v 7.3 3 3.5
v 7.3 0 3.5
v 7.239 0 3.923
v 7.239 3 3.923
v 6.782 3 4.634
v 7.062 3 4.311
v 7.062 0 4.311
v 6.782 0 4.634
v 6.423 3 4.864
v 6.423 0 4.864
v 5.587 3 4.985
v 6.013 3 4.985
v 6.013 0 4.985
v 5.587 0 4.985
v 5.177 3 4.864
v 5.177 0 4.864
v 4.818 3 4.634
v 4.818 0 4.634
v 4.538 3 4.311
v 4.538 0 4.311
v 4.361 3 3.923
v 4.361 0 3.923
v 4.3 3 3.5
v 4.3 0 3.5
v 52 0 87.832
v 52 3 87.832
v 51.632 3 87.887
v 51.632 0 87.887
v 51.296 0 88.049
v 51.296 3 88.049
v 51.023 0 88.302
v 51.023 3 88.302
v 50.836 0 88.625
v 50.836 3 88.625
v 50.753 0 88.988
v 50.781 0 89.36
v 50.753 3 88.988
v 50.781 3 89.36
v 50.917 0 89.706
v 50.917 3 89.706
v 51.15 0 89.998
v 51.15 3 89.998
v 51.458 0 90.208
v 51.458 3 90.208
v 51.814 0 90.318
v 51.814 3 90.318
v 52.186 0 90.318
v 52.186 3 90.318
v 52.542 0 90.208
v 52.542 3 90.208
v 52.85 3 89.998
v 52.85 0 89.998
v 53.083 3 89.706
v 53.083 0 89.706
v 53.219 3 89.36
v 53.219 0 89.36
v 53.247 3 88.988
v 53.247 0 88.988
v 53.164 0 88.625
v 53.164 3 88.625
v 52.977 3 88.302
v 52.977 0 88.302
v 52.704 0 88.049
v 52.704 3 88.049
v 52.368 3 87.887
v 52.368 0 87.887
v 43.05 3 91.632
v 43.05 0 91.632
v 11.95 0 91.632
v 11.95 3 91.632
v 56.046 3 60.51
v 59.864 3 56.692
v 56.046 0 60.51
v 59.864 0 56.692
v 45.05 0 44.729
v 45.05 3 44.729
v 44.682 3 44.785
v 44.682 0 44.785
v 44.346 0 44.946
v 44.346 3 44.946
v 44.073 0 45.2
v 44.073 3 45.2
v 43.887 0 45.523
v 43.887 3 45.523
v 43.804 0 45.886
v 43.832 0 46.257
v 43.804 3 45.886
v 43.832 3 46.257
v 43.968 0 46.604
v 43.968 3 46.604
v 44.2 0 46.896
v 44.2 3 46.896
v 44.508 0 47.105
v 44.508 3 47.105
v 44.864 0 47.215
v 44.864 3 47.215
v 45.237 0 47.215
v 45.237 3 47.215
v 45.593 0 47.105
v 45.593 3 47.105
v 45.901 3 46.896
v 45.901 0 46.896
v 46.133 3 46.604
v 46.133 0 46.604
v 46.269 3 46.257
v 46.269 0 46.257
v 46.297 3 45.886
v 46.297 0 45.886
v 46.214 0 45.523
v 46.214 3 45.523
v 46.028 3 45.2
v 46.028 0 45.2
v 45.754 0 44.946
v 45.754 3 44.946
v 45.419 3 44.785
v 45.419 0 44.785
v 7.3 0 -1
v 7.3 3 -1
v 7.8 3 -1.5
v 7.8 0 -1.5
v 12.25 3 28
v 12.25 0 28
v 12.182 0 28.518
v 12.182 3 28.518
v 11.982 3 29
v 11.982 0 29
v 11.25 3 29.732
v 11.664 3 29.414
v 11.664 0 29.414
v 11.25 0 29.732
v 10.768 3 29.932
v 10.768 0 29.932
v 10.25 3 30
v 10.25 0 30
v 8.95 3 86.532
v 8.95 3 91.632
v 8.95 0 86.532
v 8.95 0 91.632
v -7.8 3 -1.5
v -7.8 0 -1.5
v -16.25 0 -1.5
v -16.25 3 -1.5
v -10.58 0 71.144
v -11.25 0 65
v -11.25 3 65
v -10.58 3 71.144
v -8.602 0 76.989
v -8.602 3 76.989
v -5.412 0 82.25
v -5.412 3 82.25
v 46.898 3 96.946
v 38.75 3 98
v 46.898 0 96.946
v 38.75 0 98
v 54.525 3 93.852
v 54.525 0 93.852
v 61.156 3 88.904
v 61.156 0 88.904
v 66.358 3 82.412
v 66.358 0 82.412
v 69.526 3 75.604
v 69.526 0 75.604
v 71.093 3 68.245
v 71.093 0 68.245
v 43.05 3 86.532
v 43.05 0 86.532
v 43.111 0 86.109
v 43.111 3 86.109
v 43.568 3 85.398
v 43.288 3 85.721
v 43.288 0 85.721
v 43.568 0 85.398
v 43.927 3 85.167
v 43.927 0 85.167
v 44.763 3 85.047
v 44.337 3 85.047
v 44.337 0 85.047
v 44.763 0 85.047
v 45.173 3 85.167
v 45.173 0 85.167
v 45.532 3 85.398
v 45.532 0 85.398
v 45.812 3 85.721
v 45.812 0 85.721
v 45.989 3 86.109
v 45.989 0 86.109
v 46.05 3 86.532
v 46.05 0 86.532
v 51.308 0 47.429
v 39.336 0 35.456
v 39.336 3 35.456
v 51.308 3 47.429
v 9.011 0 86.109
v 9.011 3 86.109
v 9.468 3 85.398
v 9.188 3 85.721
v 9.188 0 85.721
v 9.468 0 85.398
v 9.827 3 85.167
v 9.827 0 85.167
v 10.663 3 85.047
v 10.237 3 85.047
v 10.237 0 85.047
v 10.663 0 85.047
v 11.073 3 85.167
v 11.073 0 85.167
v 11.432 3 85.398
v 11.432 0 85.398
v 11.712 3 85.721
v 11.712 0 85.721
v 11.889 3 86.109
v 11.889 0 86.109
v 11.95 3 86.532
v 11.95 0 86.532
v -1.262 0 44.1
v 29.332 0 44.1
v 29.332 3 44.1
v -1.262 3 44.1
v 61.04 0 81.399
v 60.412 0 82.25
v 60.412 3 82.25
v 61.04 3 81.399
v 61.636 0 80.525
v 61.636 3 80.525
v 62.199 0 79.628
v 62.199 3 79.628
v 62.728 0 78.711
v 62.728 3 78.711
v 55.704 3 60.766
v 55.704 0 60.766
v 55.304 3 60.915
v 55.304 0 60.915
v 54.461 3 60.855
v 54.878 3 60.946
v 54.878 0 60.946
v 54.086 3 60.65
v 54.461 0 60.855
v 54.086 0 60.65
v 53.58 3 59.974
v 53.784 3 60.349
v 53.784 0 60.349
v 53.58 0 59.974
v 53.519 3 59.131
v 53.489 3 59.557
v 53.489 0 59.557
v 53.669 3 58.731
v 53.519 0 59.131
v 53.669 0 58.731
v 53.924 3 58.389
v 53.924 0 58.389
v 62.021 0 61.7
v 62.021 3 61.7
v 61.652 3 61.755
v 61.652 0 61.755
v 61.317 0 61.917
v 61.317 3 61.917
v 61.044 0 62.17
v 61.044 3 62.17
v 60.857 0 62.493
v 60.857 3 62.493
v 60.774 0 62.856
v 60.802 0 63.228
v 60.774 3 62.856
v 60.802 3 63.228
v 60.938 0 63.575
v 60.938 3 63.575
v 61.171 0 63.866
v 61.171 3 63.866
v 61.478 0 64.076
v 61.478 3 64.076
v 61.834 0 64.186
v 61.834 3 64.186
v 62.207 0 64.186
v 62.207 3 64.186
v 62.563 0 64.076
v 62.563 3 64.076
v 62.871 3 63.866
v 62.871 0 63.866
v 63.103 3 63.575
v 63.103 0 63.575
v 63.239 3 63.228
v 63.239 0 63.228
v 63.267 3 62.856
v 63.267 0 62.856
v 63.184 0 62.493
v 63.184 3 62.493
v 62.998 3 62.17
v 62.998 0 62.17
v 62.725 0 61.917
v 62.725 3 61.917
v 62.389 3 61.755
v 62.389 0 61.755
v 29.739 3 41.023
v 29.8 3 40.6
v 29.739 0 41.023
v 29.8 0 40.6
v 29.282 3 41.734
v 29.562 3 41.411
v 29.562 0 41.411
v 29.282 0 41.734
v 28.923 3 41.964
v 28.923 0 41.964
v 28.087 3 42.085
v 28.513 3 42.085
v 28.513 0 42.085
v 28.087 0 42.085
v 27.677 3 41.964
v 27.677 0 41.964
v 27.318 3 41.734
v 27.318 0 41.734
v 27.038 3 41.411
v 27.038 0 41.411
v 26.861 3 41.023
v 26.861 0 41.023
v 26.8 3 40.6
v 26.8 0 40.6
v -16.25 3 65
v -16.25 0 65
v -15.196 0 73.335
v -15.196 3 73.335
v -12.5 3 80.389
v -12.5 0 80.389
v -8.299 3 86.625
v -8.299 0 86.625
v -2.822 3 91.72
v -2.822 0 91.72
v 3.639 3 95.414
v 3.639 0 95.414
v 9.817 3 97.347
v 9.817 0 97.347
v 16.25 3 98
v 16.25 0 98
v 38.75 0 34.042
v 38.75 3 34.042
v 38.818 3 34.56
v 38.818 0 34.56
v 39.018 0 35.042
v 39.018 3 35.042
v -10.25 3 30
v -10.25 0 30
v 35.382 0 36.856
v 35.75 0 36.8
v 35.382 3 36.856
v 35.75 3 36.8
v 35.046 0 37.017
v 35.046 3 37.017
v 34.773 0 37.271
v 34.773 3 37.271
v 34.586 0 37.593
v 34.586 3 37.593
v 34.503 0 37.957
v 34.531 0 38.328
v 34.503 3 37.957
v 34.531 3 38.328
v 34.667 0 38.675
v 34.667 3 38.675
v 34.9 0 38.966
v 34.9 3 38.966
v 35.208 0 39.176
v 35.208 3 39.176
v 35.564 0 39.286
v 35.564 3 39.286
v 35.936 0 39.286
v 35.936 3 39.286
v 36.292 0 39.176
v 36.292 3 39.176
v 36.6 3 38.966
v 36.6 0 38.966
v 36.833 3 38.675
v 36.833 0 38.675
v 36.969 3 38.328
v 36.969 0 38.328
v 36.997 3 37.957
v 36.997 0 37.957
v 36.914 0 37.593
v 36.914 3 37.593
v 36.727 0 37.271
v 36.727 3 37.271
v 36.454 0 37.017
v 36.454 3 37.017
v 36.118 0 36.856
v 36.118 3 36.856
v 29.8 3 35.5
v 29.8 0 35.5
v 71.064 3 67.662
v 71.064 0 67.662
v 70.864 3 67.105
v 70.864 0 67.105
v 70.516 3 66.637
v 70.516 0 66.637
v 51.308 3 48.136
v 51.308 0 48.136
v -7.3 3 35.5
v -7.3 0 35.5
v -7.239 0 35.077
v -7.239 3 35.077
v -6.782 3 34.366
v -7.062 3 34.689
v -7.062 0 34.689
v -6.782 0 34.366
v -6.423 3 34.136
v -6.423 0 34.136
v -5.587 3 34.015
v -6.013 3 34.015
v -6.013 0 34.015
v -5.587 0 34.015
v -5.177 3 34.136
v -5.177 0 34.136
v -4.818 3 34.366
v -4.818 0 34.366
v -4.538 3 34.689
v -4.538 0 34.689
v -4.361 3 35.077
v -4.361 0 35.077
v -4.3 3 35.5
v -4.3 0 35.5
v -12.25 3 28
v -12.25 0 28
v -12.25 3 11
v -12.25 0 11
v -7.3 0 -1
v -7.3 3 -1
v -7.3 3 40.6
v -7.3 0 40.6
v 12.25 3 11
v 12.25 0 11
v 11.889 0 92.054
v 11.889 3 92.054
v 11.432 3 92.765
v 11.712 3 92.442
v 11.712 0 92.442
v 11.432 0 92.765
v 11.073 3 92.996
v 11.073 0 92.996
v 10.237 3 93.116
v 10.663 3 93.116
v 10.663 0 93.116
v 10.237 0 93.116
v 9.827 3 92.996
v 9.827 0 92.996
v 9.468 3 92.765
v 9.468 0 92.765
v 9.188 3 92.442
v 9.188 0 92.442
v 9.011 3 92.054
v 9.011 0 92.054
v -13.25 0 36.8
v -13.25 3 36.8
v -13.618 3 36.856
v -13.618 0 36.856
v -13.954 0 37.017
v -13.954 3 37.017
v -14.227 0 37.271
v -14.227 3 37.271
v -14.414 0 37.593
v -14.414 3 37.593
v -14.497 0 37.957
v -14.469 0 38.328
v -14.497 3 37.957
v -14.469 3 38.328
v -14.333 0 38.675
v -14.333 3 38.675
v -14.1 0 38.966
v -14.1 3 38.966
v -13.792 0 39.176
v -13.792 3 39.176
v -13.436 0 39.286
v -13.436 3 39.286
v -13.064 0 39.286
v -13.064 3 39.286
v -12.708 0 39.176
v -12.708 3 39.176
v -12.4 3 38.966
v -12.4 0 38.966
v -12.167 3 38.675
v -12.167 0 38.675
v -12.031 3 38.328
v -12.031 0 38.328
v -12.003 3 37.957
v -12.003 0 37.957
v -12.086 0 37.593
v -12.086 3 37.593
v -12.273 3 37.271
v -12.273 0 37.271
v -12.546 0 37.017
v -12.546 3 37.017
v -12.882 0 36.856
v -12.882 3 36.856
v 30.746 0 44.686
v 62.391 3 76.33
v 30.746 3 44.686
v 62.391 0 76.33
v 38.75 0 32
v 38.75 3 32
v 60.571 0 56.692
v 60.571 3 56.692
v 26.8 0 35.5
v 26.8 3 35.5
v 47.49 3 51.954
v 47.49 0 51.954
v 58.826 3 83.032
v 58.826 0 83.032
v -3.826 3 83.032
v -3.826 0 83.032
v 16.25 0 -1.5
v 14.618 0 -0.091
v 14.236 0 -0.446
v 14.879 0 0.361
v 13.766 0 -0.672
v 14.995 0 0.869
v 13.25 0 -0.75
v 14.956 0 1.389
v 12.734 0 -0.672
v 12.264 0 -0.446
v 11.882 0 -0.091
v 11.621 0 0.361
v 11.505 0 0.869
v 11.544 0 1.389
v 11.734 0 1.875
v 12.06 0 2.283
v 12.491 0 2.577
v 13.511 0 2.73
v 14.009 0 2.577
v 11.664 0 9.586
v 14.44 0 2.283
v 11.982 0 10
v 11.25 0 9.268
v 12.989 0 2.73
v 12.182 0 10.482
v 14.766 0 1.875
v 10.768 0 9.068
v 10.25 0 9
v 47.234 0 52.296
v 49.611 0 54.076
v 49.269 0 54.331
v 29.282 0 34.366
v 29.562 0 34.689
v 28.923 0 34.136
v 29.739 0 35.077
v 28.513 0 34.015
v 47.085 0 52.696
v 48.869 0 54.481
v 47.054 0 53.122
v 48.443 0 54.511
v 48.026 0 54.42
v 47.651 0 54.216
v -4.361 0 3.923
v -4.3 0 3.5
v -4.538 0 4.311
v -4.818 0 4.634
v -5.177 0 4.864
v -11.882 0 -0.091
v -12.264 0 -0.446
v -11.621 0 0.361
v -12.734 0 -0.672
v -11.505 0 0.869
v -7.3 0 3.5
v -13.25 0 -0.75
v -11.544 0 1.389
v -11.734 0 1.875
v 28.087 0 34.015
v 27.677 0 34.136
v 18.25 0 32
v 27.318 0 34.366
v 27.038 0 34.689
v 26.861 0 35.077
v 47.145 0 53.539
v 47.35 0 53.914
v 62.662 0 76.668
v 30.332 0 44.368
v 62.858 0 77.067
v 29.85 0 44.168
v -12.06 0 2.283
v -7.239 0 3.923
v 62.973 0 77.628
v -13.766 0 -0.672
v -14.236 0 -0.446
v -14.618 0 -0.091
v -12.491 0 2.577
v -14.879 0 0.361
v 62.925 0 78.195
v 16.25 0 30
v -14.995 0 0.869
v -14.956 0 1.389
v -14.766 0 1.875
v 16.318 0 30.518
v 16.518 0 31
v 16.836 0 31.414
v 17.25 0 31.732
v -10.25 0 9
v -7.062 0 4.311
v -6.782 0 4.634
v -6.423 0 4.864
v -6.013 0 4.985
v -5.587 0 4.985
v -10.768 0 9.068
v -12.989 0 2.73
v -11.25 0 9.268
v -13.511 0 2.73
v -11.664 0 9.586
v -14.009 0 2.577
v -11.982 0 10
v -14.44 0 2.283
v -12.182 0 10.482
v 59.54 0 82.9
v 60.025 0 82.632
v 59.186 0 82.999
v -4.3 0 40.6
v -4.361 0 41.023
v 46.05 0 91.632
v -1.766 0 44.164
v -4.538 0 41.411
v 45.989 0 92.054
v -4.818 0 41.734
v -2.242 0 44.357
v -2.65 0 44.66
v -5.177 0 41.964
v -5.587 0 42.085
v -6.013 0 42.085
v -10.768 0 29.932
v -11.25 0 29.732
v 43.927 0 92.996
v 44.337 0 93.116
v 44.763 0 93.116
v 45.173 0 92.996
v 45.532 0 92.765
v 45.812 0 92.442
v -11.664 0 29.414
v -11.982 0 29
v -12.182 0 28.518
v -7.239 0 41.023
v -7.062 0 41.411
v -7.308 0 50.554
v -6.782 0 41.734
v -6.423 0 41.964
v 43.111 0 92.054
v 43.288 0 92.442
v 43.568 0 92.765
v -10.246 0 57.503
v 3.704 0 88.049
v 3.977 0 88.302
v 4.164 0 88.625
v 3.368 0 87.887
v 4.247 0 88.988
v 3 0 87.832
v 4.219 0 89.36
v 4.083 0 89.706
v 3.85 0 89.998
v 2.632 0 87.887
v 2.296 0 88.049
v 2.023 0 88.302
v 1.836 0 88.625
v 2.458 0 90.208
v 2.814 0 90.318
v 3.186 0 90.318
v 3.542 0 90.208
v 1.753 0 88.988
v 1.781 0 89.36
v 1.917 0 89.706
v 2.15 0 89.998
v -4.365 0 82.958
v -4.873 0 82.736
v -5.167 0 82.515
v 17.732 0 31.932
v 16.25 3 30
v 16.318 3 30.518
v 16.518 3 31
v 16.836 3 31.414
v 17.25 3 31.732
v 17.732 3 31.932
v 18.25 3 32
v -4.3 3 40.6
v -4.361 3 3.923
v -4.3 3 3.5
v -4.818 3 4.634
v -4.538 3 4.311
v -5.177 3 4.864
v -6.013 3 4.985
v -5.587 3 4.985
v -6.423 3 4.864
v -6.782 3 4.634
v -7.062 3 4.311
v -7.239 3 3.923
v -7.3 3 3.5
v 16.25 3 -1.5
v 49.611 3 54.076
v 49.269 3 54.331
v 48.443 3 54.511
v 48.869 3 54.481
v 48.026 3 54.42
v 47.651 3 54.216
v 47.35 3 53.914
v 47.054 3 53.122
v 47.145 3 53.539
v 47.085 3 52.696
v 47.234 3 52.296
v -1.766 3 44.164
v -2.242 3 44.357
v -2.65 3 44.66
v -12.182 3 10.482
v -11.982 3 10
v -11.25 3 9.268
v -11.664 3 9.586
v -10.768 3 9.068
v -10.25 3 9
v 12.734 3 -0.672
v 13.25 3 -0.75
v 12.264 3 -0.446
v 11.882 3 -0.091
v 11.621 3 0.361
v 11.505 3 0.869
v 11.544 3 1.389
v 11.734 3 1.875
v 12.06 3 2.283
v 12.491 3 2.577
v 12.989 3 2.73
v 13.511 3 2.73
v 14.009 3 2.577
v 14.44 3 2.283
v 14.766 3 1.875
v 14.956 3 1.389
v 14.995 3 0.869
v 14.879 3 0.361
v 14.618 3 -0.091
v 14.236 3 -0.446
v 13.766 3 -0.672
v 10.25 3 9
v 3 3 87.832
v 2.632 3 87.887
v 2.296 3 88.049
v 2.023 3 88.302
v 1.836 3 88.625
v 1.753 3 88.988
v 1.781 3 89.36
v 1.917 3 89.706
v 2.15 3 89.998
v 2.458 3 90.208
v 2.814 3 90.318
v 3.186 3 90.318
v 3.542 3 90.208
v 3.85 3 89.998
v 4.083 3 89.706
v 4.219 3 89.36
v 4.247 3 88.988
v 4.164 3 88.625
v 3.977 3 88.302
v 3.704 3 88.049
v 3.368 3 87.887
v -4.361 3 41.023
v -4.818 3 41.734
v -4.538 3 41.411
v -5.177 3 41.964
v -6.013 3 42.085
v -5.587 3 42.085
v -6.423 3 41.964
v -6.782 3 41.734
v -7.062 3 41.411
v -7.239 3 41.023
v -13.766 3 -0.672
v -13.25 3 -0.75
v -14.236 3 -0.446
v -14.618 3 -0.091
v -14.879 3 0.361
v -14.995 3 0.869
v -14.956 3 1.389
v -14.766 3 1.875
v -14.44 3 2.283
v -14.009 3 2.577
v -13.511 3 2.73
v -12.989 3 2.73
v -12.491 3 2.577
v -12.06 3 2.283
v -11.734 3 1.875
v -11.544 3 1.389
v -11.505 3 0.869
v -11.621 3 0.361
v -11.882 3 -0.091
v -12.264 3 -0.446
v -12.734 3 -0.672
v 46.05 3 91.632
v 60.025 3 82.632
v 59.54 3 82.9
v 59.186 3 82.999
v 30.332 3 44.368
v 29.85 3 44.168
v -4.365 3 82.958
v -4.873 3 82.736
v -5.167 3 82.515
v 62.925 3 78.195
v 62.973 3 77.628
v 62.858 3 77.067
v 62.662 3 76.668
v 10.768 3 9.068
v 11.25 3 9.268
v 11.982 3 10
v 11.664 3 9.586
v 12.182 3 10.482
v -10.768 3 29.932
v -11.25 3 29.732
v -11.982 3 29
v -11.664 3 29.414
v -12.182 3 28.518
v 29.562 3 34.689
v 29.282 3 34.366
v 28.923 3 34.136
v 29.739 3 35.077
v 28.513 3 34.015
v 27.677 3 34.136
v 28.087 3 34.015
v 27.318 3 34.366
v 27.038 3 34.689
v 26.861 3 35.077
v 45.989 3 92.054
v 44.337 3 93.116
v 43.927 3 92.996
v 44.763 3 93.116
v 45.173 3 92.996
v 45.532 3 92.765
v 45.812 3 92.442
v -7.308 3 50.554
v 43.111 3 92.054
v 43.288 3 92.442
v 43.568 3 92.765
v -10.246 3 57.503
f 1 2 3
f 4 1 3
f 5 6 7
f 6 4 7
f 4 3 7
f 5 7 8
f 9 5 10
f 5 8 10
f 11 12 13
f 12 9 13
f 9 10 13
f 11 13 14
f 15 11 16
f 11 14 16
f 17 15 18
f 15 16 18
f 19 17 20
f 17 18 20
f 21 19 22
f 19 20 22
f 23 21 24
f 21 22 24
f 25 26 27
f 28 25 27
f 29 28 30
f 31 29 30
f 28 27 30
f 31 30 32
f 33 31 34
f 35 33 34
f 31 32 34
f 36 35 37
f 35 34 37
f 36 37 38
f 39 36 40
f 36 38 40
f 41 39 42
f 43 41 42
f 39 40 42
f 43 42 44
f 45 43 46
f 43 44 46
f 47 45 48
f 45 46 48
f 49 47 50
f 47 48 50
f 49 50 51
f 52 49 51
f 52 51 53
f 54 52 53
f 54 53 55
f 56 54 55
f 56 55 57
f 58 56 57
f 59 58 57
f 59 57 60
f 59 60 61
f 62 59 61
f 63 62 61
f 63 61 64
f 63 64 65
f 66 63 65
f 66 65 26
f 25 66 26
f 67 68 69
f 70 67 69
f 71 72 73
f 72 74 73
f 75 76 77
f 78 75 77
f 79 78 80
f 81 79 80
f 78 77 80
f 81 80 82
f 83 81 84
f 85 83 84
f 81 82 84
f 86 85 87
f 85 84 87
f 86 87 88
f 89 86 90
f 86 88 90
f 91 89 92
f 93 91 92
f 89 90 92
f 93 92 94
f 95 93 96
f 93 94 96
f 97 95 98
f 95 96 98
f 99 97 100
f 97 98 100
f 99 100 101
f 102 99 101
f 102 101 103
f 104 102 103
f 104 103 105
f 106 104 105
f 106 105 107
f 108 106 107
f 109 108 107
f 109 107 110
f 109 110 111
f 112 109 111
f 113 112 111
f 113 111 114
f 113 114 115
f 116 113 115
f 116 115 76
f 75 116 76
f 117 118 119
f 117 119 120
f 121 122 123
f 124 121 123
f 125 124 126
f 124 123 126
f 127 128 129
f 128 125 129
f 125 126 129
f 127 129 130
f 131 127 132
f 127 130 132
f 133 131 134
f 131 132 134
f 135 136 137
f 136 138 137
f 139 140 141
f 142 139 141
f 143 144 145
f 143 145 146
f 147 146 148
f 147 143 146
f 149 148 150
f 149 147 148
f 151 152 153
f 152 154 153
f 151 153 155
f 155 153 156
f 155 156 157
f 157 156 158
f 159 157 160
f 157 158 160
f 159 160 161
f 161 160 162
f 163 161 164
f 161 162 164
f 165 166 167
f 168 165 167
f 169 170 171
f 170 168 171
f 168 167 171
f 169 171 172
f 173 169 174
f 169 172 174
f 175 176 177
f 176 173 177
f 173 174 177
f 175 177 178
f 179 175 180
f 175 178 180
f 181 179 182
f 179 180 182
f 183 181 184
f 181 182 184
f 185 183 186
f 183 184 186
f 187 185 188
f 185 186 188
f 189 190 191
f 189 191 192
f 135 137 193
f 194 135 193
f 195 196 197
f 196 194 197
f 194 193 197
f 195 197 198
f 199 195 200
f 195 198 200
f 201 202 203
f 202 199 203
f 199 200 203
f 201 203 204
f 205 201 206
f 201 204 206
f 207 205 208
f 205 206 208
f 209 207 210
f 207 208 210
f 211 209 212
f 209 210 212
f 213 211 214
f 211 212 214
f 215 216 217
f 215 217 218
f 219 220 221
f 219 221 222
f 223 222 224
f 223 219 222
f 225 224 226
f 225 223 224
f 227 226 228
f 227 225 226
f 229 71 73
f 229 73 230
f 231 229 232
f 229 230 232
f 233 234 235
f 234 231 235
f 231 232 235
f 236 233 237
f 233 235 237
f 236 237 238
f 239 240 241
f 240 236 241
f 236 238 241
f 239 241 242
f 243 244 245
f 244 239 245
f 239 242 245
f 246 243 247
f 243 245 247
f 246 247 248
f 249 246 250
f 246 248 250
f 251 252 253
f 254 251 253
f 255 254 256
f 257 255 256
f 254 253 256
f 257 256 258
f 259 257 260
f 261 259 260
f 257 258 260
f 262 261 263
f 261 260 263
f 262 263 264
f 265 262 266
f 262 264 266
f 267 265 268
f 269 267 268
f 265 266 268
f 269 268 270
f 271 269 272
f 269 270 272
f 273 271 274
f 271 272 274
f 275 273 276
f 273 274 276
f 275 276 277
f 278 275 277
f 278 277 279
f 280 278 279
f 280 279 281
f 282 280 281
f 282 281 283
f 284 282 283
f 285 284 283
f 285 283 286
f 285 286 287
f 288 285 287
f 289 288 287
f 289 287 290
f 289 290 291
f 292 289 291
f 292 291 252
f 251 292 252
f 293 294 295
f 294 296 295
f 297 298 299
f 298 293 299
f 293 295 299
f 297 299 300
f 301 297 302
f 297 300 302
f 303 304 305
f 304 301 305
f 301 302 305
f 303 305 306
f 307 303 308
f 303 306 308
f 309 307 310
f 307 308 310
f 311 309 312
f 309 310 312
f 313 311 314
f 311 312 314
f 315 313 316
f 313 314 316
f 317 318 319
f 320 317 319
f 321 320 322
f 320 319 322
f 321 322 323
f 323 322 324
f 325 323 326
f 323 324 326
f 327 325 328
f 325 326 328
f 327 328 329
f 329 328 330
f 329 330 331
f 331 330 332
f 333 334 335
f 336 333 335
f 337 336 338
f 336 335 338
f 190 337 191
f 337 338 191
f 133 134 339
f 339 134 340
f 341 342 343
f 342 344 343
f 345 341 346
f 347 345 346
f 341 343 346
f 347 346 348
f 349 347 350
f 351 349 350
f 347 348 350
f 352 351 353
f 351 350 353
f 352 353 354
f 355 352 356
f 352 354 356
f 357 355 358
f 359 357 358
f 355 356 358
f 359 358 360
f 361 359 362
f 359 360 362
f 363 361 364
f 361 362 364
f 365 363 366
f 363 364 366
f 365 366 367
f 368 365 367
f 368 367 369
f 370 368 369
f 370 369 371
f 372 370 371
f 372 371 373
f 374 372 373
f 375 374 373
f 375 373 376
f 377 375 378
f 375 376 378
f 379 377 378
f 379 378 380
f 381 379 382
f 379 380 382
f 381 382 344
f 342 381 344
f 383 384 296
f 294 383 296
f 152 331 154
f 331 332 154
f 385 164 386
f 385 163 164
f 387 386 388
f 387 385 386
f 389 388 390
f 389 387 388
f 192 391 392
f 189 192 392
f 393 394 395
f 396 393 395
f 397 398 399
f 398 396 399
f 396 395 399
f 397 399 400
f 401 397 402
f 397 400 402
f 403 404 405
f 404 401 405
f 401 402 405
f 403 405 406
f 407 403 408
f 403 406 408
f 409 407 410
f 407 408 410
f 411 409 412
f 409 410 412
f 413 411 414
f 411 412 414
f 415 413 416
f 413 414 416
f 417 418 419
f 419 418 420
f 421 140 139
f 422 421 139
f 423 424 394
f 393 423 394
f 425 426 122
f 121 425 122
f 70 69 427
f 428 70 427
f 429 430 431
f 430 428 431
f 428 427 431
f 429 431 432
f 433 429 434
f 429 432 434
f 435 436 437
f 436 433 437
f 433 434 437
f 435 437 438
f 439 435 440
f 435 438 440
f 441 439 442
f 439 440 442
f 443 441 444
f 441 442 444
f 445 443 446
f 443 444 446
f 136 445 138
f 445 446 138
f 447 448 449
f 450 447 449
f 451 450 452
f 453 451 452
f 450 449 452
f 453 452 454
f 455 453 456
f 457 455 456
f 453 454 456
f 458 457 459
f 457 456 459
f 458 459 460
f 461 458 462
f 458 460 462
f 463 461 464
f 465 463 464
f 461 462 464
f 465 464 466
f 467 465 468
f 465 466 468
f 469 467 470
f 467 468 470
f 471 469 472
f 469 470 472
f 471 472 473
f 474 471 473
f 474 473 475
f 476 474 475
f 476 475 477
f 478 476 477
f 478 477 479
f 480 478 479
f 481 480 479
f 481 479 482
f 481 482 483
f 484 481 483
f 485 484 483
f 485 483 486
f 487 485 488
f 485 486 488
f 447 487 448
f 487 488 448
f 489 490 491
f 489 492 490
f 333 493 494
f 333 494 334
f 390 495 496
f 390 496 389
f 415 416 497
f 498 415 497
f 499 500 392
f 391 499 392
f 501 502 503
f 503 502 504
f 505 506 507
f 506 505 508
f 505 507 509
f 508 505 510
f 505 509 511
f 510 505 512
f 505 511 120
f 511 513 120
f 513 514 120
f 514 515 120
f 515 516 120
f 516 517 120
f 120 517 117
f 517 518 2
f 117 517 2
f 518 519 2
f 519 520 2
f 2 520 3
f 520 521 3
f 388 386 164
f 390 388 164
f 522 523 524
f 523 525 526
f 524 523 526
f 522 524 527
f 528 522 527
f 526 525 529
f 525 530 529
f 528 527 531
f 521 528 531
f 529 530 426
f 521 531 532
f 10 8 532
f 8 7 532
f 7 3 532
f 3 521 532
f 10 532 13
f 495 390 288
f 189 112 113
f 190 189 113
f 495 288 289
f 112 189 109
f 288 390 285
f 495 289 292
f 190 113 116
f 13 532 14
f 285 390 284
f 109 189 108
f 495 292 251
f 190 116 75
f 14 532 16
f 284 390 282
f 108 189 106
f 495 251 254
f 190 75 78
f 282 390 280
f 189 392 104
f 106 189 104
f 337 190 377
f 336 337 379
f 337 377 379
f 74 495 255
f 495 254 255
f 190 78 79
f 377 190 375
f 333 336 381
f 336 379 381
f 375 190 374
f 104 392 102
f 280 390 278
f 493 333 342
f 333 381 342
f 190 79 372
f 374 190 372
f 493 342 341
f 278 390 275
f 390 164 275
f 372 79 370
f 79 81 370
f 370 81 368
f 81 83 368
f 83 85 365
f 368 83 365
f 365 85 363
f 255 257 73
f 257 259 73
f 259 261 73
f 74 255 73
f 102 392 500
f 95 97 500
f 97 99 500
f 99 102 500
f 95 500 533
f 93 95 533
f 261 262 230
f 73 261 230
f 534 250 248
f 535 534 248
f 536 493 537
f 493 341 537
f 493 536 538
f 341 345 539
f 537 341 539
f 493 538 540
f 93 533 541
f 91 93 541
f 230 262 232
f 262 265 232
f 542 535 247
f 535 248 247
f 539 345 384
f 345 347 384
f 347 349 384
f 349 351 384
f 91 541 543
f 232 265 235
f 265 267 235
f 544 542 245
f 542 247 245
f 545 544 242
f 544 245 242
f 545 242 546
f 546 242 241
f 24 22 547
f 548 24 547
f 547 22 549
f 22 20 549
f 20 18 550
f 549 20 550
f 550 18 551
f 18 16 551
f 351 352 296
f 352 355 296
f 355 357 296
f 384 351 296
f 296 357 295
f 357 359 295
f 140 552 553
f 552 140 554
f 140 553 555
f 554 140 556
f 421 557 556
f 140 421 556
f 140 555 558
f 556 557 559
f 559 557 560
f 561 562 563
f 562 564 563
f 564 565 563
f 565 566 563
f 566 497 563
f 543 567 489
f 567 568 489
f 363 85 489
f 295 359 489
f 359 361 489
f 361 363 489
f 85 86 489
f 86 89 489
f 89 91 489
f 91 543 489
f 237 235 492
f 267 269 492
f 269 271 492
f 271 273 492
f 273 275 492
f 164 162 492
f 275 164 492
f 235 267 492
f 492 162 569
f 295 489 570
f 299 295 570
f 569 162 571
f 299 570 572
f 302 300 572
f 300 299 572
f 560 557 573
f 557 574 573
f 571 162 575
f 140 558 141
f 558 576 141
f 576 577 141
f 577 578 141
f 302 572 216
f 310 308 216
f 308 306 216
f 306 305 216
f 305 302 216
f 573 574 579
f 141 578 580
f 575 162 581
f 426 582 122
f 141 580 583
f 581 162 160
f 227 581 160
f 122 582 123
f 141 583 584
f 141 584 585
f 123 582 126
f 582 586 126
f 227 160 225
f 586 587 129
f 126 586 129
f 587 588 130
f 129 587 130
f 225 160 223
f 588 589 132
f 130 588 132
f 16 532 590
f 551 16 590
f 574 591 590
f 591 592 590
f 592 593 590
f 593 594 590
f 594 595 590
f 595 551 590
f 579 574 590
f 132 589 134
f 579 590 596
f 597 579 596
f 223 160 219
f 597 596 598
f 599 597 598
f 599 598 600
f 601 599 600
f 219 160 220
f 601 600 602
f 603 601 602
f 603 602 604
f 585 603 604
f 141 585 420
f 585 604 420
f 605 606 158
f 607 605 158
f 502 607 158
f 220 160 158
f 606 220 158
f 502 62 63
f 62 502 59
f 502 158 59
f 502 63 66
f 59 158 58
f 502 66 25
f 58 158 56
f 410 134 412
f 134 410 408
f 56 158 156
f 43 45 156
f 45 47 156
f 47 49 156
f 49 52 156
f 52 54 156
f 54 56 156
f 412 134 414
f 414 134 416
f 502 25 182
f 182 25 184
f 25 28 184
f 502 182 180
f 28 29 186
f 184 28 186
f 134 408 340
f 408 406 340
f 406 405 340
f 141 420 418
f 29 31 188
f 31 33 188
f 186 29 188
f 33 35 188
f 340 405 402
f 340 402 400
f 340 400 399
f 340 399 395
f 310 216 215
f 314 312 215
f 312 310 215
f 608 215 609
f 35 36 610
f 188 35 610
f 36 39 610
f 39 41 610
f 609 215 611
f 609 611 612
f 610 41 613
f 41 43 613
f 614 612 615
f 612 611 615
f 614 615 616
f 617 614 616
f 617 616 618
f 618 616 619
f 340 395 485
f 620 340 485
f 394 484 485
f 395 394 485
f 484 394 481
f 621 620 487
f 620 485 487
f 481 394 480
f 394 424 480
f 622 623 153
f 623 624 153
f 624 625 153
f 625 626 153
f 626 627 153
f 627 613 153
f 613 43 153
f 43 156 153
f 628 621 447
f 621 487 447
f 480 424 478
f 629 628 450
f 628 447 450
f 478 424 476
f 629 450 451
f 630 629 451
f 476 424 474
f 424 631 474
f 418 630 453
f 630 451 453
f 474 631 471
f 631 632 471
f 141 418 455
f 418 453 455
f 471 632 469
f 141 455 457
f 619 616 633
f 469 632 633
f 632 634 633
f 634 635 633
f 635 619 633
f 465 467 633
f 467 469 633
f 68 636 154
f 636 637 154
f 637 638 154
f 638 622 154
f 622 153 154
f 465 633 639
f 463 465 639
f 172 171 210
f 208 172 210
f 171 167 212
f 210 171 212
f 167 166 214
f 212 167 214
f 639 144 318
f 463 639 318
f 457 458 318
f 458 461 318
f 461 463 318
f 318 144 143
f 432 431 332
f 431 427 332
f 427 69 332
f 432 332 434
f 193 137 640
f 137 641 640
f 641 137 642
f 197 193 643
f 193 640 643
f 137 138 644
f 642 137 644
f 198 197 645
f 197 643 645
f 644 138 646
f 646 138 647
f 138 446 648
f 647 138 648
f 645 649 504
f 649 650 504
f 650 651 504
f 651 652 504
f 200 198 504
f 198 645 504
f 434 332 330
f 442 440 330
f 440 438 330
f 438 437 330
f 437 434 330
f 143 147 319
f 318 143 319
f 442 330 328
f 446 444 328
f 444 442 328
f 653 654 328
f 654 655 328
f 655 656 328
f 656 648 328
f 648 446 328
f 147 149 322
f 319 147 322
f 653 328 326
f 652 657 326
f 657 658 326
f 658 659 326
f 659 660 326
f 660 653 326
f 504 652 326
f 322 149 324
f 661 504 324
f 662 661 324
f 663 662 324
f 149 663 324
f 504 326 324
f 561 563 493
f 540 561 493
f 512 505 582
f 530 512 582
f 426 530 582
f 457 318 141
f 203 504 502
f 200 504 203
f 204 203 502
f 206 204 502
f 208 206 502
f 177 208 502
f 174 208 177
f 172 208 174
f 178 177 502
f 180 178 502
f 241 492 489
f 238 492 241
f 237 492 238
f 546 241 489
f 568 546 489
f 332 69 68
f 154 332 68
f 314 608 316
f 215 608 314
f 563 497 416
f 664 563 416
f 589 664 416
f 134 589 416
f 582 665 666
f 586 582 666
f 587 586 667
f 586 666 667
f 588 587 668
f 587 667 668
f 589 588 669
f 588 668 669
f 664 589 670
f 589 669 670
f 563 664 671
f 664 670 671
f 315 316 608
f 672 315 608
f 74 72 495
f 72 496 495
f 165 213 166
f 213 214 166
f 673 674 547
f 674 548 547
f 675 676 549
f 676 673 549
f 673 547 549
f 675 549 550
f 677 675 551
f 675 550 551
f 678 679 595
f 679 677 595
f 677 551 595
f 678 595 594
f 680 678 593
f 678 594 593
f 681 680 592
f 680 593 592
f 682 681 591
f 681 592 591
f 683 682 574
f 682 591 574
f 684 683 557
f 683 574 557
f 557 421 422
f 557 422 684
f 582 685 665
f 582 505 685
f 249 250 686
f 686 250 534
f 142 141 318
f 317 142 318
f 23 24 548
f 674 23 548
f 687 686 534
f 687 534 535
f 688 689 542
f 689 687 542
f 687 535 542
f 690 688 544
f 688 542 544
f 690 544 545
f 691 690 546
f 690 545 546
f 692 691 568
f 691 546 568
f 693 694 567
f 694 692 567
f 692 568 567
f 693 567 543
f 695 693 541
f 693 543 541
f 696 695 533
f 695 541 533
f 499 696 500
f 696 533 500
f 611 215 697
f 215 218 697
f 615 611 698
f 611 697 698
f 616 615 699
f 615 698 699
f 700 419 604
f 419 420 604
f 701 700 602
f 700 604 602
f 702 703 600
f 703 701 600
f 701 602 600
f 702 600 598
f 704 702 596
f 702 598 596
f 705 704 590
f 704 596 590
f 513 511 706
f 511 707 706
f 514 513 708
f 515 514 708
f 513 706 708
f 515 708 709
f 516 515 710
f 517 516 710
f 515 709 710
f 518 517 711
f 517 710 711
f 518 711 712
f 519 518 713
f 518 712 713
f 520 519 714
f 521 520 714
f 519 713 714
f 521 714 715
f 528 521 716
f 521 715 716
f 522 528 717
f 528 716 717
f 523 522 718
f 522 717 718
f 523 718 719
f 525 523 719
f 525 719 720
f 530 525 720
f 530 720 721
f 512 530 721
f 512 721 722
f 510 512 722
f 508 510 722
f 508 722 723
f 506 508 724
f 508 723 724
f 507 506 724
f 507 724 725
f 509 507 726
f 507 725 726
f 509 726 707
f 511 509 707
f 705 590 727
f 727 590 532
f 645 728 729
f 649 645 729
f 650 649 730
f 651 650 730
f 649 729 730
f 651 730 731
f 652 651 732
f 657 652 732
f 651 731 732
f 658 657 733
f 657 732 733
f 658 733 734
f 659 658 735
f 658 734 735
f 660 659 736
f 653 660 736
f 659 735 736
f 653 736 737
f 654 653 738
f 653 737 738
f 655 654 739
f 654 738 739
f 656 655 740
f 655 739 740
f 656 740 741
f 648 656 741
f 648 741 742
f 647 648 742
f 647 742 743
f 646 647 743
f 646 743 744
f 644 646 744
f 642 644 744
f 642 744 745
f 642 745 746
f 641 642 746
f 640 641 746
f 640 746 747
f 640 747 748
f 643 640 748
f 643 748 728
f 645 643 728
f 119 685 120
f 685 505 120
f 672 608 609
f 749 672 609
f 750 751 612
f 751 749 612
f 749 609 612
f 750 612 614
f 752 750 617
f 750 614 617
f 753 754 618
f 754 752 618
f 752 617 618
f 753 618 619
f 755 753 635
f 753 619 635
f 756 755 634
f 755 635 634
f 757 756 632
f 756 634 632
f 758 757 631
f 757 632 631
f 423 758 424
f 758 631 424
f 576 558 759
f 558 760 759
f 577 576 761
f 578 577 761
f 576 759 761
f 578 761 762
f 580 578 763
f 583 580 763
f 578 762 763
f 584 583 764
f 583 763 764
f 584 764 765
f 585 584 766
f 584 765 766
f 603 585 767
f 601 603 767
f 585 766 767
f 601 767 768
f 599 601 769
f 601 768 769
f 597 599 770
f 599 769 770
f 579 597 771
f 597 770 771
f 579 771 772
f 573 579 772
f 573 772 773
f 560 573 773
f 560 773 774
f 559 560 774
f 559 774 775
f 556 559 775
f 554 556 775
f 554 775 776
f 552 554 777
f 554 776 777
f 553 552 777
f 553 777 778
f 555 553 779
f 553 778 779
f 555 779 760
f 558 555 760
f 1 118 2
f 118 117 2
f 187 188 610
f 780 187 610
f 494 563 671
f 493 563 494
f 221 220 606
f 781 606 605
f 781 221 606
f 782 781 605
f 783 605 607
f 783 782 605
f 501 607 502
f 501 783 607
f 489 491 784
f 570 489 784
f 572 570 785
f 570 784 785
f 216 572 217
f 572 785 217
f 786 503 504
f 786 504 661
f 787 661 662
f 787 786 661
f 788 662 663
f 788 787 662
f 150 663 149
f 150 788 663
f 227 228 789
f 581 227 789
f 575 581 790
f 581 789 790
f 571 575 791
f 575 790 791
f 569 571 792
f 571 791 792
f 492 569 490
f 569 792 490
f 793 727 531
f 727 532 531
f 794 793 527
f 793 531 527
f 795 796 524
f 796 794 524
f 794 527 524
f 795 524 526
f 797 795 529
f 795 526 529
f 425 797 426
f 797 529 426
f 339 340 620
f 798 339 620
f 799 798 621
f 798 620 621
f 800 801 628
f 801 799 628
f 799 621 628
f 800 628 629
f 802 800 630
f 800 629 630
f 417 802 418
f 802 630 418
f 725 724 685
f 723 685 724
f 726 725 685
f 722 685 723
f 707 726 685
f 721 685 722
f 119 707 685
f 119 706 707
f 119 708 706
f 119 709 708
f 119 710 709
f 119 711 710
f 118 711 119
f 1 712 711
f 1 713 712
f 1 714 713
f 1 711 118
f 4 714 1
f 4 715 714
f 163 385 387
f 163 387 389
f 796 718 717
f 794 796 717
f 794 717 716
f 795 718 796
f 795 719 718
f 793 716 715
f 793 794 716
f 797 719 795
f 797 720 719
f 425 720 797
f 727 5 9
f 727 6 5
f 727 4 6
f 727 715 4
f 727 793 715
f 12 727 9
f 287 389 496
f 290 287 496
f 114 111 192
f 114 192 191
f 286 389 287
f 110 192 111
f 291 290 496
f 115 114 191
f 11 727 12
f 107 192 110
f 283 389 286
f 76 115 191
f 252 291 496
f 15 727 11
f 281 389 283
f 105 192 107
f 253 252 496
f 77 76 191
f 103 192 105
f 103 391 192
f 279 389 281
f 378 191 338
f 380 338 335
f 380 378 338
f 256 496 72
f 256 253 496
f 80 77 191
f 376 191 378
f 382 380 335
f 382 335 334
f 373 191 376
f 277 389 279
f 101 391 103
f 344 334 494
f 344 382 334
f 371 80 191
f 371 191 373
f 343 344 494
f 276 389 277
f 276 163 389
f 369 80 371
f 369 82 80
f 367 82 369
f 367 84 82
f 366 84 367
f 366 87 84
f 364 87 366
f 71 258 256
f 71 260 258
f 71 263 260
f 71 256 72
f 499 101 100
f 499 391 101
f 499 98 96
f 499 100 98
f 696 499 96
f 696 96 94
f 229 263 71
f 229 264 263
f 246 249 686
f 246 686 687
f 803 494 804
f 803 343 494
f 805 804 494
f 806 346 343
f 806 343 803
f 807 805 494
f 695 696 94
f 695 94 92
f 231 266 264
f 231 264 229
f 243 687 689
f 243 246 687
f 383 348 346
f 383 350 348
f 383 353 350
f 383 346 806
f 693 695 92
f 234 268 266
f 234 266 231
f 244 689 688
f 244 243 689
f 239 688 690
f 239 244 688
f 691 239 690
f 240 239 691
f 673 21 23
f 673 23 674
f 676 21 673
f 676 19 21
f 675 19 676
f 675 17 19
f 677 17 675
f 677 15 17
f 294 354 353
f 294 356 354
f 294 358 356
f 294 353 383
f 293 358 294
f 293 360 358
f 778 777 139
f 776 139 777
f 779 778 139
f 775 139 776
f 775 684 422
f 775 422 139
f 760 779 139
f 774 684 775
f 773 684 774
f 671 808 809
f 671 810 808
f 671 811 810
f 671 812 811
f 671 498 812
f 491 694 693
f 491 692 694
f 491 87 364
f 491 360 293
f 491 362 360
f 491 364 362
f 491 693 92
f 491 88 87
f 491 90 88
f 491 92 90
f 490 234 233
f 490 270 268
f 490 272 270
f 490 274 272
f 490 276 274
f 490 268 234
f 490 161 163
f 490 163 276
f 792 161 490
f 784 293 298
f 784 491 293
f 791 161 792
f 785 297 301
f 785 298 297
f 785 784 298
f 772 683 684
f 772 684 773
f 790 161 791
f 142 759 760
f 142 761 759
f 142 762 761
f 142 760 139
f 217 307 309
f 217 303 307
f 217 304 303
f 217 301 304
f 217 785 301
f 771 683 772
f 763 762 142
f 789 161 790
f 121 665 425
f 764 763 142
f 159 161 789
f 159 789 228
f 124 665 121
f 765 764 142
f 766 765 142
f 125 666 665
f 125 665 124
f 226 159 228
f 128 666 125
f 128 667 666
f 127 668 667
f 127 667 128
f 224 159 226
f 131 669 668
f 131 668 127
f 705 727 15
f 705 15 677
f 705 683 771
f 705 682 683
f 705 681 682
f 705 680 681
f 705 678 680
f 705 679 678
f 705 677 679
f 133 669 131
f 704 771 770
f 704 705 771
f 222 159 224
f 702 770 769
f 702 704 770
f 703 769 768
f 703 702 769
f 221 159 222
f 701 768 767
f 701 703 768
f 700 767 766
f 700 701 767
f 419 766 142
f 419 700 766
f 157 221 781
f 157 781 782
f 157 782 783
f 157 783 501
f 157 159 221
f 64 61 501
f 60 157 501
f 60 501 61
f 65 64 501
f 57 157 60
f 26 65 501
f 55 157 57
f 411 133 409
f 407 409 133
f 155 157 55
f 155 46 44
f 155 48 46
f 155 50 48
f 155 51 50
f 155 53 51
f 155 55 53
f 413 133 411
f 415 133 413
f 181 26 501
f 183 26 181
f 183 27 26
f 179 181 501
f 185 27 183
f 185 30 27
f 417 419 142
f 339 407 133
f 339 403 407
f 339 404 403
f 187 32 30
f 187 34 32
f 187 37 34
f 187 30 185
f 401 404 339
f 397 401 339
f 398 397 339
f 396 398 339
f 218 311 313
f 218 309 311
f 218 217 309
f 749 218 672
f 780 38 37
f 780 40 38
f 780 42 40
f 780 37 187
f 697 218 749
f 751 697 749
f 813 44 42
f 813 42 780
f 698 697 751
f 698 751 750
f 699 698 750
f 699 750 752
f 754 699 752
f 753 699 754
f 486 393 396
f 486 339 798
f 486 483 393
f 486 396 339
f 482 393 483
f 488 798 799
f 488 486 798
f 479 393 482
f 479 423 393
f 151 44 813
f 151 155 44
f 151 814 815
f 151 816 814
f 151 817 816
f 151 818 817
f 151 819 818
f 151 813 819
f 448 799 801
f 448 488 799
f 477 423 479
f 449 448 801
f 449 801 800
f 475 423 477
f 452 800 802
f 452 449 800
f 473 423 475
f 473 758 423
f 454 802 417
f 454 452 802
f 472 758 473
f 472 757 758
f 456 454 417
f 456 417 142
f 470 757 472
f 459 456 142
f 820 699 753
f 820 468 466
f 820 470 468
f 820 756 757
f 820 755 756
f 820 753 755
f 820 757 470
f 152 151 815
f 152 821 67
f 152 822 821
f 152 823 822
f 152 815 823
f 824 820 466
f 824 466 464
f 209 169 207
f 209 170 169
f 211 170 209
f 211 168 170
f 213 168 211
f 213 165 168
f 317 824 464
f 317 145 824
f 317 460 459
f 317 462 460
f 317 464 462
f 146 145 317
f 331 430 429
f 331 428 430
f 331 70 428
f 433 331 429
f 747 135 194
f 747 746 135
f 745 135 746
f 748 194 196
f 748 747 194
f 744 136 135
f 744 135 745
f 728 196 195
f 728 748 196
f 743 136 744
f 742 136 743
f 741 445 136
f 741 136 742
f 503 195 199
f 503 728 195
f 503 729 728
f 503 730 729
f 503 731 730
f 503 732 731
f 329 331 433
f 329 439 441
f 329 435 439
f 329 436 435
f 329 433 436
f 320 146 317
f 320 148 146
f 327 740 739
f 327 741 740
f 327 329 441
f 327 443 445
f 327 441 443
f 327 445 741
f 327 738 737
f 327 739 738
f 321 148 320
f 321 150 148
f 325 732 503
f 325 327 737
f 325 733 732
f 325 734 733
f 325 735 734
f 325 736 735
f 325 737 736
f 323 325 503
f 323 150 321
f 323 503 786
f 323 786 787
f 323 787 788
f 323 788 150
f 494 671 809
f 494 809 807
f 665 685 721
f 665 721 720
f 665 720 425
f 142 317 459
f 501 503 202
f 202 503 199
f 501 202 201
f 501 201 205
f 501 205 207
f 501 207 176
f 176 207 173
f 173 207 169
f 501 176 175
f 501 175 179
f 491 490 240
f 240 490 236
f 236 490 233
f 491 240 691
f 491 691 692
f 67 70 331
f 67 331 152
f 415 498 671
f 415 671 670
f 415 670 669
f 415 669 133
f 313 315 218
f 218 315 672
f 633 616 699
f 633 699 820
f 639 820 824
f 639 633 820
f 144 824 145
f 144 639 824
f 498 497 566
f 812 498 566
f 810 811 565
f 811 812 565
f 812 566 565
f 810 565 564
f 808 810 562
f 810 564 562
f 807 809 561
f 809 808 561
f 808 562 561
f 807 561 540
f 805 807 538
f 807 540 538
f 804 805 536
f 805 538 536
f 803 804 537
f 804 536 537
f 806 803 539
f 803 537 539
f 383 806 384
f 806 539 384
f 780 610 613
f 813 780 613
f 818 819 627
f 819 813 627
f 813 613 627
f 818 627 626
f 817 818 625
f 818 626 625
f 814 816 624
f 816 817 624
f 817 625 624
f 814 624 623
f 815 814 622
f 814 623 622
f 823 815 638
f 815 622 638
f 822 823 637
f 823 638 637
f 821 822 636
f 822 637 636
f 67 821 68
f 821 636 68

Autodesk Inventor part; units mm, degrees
ref_plane "YZ Plane" through (0, 0, 0) normal (1, 0, 0) x (0, 1, 0)
ref_plane "XZ Plane" through (0, 0, 0) normal (0, 1, 0) x (-1, 0, 0)
ref_plane "XY Plane" through (0, 0, 0) normal (0, 0, 1) x (1, 0, 0)
sketch "Sketch1" plane through (0, 0, 0) normal (0, 1, 0) x (-1, 0, 0)
  line L0 (-16.25, -1.5) -> (16.25, -1.5)
  line L1 (-7.25, -1.5) -> (-7.25, 3.5) construction
  line L2 (-7.25, 3.5) -> (7.25, 3.5) construction
  line L3 (0, 3.5) -> (0, -1.5) construction
  line L4 (7.25, -1.5) -> (7.25, 3.5) construction
  line L5 (-13.25, 1) -> (13.25, 1) construction
  line L6 (-7.3, -1.5) -> (-7.3, 3.5)
  line L7 (-7.3, 3.5) -> (7.3, 3.5)
  arc A0 (-4.3, 3.5) -> (-7.3, 3.5) centre (-5.8, 3.5) ccw
  line L8 (7.3, -1.5) -> (7.3, 3.5)
  arc A1 (7.3, 3.5) -> (4.3, 3.5) centre (5.8, 3.5) ccw
  line L9 (-16.25, -1.5) -> (-16.25, 32)
  line L10 (16.25, -1.5) -> (16.25, 65)
  ellipse E0 centre (-16.25, 65) end of major axis (18.25, 65) minor radius 35 (-16.25, 30) -> (-16.25, 100) ccw construction
  line L11 (-16.25, 30) -> (-16.25, 100) construction
  line L12 (-16.25, 65) -> (18.25, 65) construction
  ellipse E1 centre (-16.25, 65) end of major axis (16.25, 65) minor radius 33 (-16.25, 32) -> (16.25, 65) ccw construction
  line L13 (-16.25, 32) -> (-38.75, 32)
  line L14 (-16.25, 98) -> (-38.75, 98)
  line L15 (-27.5, 98) -> (-27.5, 32) construction
  ellipse E2 centre (-38.75, 65) end of major axis (-73.25, 65) minor radius 35 (-38.75, 100) -> (-38.75, 30) ccw construction
  ellipse E3 centre (-38.75, 65) end of major axis (-71.25, 65) minor radius 33 (-38.75, 98) -> (-71.1715, 67.2921) ccw
  line L16 (-38.75, 30) -> (-16.25, 30) construction
  line L17 (-38.75, 100) -> (-16.25, 100) construction
  line L18 (-10.25, 30) -> (10.25, 30)
  line L19 (12.25, 28) -> (12.25, 11)
  line L20 (10.25, 9) -> (-10.25, 9)
  line L21 (-12.25, 11) -> (-12.25, 28)
  line L22 (-12.25, 30) -> (12.25, 9) construction
  line L23 (12.25, 30) -> (-12.25, 9) construction
  arc A2 (-10.25, 30) -> (-12.25, 28) centre (-10.25, 28) ccw
  arc A3 (-12.25, 11) -> (-10.25, 9) centre (-10.25, 11) ccw
  arc A4 (10.25, 9) -> (12.25, 11) centre (10.25, 11) ccw
  arc A5 (12.25, 28) -> (10.25, 30) centre (10.25, 28) ccw
  line L24 (-38.75, 30) -> (-38.75, 100) construction
  line L25 (-38.75, 32) -> (-38.75, 34.8706)
  line L26 (-38.75, 34.8706) -> (-71.1715, 67.2921)
  line L27 (-62.0208, 45.9792) -> (-108, 0) construction
  line L28 (-108, 0) -> (0, 0) construction
  ellipse E4 centre (-38.75, 65) end of major axis (-71.25, 65) minor radius 33 (-71.1715, 67.2921) -> (-38.75, 32) ccw construction
  ellipse E5 centre (-16.25, 65) end of major axis (16.25, 65) minor radius 33 (16.25, 65) -> (-16.25, 98) ccw
  line L29 (-55, 91.5815) -> (0, 91.5815) construction
  line L30 (0, 91.5815) -> (0, 86.5815) construction
  line L31 (0, 86.5815) -> (-55, 86.5815) construction
  line L32 (-55, 86.5815) -> (-55, 91.5815) construction
  line L33 (-55, 91.5815) -> (0, 86.5815) construction
  line L34 (0, 91.5815) -> (-55, 86.5815) construction
  line L35 (-47.5, 91.5815) -> (-47.5, 96.7815) construction
  line L36 (-47.5, 96.7815) -> (-7.5, 96.7815) construction
  line L37 (-7.5, 96.7815) -> (-7.5, 91.5815) construction
  line L38 (-46, 91.5815) -> (-46, 86.5815) construction
  line L39 (-52, 89.0815) -> (-3, 89.0815) construction
  line L40 (-9, 91.5815) -> (-9, 86.5815) construction
  line L41 (-8.95, 86.5315) -> (-46.05, 86.5315)
  line L42 (-46.05, 86.5315) -> (-46.05, 91.6315)
  line L43 (-46.05, 91.6315) -> (-8.95, 91.6315)
  line L44 (-8.95, 91.6315) -> (-8.95, 86.5315)
  line L45 (-8.95, 86.5315) -> (-46.05, 91.6315) construction
  line L46 (-46.05, 86.5315) -> (-8.95, 91.6315) construction
  arc A6 (-43.05, 91.6315) -> (-46.05, 91.6315) centre (-44.55, 91.6315) ccw
  arc A7 (-46.05, 86.5315) -> (-43.05, 86.5315) centre (-44.55, 86.5315) ccw
  arc A8 (-8.95, 91.6315) -> (-11.95, 91.6315) centre (-10.45, 91.6315) ccw
  arc A9 (-11.95, 86.5315) -> (-8.95, 86.5315) centre (-10.45, 86.5315) ccw
  line L47 (-54.1012, 75.112) -> (-60.6066, 68.6066) construction
  line L48 (-60.6066, 68.6066) -> (-39.3934, 47.3934) construction
  line L49 (-39.3934, 47.3934) -> (-32.888, 53.8988) construction
  line L50 (-32.888, 53.8988) -> (-54.1012, 75.112) construction
  line L51 (-56.0104, 64.0104) -> (-72.2739, 47.747) construction
  line L52 (-72.2739, 47.747) -> (-60.253, 35.7261) construction
  line L53 (-60.253, 35.7261) -> (-43.9896, 51.9896) construction
  line L54 (-60.1823, 56.3029) -> (-56.0104, 60.4749) construction
  line L55 (-56.0104, 60.4749) -> (-47.5251, 51.9896) construction
  line L56 (-47.5251, 51.9896) -> (-51.6971, 47.8177) construction
  line L57 (-60.2177, 56.3383) -> (-56.0458, 60.5102)
  line L58 (-56.0458, 60.5102) -> (-47.4898, 51.9542)
  line L59 (-47.4898, 51.9542) -> (-51.6617, 47.7823)
  arc A10 (-47.4898, 51.9542) -> (-49.6111, 54.0756) centre (-48.5504, 53.0149) ccw
  arc A11 (-53.9244, 58.3889) -> (-56.0458, 60.5102) centre (-54.9851, 59.4496) ccw
  line L60 (-62.0208, 62.9497) -> (-45.0503, 45.9792) construction
  line L61 (-51.7678, 56.2322) -> (-55.3033, 52.6967) construction
  line L62 (-59.5459, 56.9393) -> (-51.0607, 48.4541) construction
  circle A12 centre (-45.0503, 45.9792) radius 2.4 construction
  circle A13 centre (-45.0503, 45.9792) radius 1.25 construction
  line L63 (-65.9099, 63.3033) -> (-62.3744, 66.8388) construction
  line L64 (-44.6967, 42.0901) -> (-41.1612, 45.6256) construction
  line L65 (-29.75, 40.55) -> (7.25, 40.55) construction
  line L66 (7.25, 40.55) -> (7.25, 35.55) construction
  line L67 (7.25, 35.55) -> (-29.75, 35.55) construction
  line L68 (-29.75, 35.55) -> (-29.75, 40.55) construction
  line L69 (-29.75, 40.55) -> (7.25, 35.55) construction
  line L70 (7.25, 40.55) -> (-29.75, 35.55) construction
  line L71 (-35.75, 38.05) -> (13.25, 38.05) construction
  line L72 (-11.25, 40.55) -> (-11.25, 35.55) construction
  line L73 (-38.75, 40.55) -> (-38.75, 35.55) construction
  line L74 (16.25, 40.55) -> (16.25, 35.55) construction
  line L75 (-29.8, 40.6) -> (7.3, 40.6)
  line L76 (7.3, 40.6) -> (7.3, 35.5)
  line L77 (7.3, 35.5) -> (-29.8, 35.5)
  line L78 (-29.8, 35.5) -> (-29.8, 40.6)
  line L79 (-29.8, 40.6) -> (7.3, 35.5) construction
  line L80 (7.3, 40.6) -> (-29.8, 35.5) construction
  arc A14 (4.3, 35.5) -> (7.3, 35.5) centre (5.8, 35.5) ccw
  arc A15 (7.3, 40.6) -> (4.3, 40.6) centre (5.8, 40.6) ccw
  arc A16 (-29.8, 35.5) -> (-26.8, 35.5) centre (-28.3, 35.5) ccw
  arc A17 (-26.8, 40.6) -> (-29.8, 40.6) centre (-28.3, 40.6) ccw
  line L81 (-59.7893, 83.0315) -> (4.7893, 83.0315)
  line L82 (-63.4241, 77.3638) -> (-30.1603, 44.1)
  ellipse E6 centre (-16.25, 65) end of major axis (11.25, 65) minor radius 28.0012 (2.0513, 44.1) -> (11.25, 65) ccw
  ellipse E7 centre (-16.25, 65) end of major axis (11.25, 65) minor radius 28.0012 (11.25, 65) -> (4.7893, 83.0315) ccw
  ellipse E8 centre (-38.75, 65) end of major axis (-66.25, 65) minor radius 28.0012 (-59.7893, 83.0315) -> (-63.4241, 77.3638) ccw
  line L83 (-16.25, 65) -> (8.5857, 86.2852) construction
  line L84 (-30.1603, 44.1) -> (2.0513, 44.1)
  line L85 (-62.0208, 45.9792) -> (-32.844, 9.9488)
  line L86 (-32.844, 9.9488) -> (-98.0512, 75.156)
  line L87 (-98.0512, 75.156) -> (-62.0208, 45.9792)
  line L88 (-38.75, 65) -> (-73.25, 65) construction
  point P0 (0, 1)
  point P1 (0, 19.5)
  point P2 (5.8, 5)
  point P3 (-27.5, 89.0815)
  point P4 (-53.5355, 54.4645)
  point P5 (-50, 58)
  point P6 (-11.25, 38.05)
  point P7 (-11.25, 38.05)
  point P8 (4.3, 3.5)
  point P9 (-53.9244, 58.3889)
  point P10 (-26.8, 35.5)
  point P11 (-26.8, 40.6)
  point P12 (4.3, 40.6)
  point P13 (-11.95, 91.6315)
  point P14 (-11.95, 86.5315)
  point P15 (-43.05, 86.5315)
  point P16 (-10.45, 85.0315)
  point P17 (-28.3, 34)
  point P18 (5.8, 42.1)
  point P19 (-27.5, 89.0815)
  dimension "d0" = 32.5
  dimension "d1" = 9
  dimension "d2" = 6
  dimension "d3" = 1.5
  dimension "d4" = 5
  dimension "d5" = 0.05
  dimension "d7" = 1.5
  dimension "d8" = 70
  dimension "d10" = 100
  dimension "d12" = 2
  dimension "d14" = 2
  dimension "d15" = 22.5
  dimension "d16" = 4
  dimension "d18" = 2
  dimension "d19" = 55
  dimension "d20" = 5
  dimension "d21" = 5.2
  dimension "d22" = 40
  dimension "d24" = 9
  dimension "d25" = 6
  dimension "d26" = 0.05
  dimension "d27" = 0.05
  dimension "d28" = 6
  dimension "d29" = 9.2
  dimension "d30" = 23
  dimension "d31" = 17
  dimension "d32" = 30
  dimension "d33" = 0.05
  dimension "d34" = 5
  dimension "d35" = 6
  dimension "d36" = 2.5
  dimension "d37" = 4.8
  dimension "d38" = 2.5
  dimension "d39" = 1
  dimension "d40" = 50
  dimension "d41" = 58
  dimension "d42" = 45
  dimension "d43" = 30
  dimension "d44" = 9
  dimension "d46" = 5
  dimension "d47" = 6
  dimension "d48" = 9
  dimension "d49" = 0.05
  dimension "d50" = 0.05
  dimension "d54" = 5
  dimension "d56" = 10
  dimension "d59" = 5
  dimension "d61" = 3.55
  dimension "d80" = 55
  dimension "d83" = 2
  dimension "d84" = 2
  dimension "d85" = 168
  dimension "d86" = 24.5
  dimension "d87" = 2
extrude "Extrusion1" add sketch "Sketch1" along normal blind 3 contours L9 L13 L25 L26 L59 A10 L58 A11 L57 E3 L14 E5 L10 L0 L8 A1 L7 A0 L6
hole "Phi3.5" at (13.25, 0, 1) at (-13.25, 0, 1) direction (0, 1, 0) diameter 3.5 end through all
hole "Phi2.5" at (52, 0, 89.0815) at (3, 0, 89.0815) at (62.0208, 0, 62.9497) at (45.0503, 0, 45.9792) at (35.75, 0, 38.05) at (-13.25, 0, 38.05) direction (0, 1, 0) diameter 2.5 end through all
chamfer "C0.5" distance 0.5 angle 45 4 edges at (60.2177, 1.5, 56.3383) (51.6617, 1.5, 47.7823) (7.3, 1.5, -1.5) (-7.3, 1.5, -1.5)
fillet "R2" radius 2 8 edges at (63.4241, 1.5, 77.3638) (59.7893, 1.5, 83.0315) (-4.7893, 1.5, 83.0315) (-2.0513, 1.5, 44.1) (30.1603, 1.5, 44.1) (16.25, 1.5, 32) (38.75, 1.5, 34.8706) (71.1715, 1.5, 67.2921)
equation "\"d14\" = d12"
properties part number "HeadSideFrame" material "CFRP"
